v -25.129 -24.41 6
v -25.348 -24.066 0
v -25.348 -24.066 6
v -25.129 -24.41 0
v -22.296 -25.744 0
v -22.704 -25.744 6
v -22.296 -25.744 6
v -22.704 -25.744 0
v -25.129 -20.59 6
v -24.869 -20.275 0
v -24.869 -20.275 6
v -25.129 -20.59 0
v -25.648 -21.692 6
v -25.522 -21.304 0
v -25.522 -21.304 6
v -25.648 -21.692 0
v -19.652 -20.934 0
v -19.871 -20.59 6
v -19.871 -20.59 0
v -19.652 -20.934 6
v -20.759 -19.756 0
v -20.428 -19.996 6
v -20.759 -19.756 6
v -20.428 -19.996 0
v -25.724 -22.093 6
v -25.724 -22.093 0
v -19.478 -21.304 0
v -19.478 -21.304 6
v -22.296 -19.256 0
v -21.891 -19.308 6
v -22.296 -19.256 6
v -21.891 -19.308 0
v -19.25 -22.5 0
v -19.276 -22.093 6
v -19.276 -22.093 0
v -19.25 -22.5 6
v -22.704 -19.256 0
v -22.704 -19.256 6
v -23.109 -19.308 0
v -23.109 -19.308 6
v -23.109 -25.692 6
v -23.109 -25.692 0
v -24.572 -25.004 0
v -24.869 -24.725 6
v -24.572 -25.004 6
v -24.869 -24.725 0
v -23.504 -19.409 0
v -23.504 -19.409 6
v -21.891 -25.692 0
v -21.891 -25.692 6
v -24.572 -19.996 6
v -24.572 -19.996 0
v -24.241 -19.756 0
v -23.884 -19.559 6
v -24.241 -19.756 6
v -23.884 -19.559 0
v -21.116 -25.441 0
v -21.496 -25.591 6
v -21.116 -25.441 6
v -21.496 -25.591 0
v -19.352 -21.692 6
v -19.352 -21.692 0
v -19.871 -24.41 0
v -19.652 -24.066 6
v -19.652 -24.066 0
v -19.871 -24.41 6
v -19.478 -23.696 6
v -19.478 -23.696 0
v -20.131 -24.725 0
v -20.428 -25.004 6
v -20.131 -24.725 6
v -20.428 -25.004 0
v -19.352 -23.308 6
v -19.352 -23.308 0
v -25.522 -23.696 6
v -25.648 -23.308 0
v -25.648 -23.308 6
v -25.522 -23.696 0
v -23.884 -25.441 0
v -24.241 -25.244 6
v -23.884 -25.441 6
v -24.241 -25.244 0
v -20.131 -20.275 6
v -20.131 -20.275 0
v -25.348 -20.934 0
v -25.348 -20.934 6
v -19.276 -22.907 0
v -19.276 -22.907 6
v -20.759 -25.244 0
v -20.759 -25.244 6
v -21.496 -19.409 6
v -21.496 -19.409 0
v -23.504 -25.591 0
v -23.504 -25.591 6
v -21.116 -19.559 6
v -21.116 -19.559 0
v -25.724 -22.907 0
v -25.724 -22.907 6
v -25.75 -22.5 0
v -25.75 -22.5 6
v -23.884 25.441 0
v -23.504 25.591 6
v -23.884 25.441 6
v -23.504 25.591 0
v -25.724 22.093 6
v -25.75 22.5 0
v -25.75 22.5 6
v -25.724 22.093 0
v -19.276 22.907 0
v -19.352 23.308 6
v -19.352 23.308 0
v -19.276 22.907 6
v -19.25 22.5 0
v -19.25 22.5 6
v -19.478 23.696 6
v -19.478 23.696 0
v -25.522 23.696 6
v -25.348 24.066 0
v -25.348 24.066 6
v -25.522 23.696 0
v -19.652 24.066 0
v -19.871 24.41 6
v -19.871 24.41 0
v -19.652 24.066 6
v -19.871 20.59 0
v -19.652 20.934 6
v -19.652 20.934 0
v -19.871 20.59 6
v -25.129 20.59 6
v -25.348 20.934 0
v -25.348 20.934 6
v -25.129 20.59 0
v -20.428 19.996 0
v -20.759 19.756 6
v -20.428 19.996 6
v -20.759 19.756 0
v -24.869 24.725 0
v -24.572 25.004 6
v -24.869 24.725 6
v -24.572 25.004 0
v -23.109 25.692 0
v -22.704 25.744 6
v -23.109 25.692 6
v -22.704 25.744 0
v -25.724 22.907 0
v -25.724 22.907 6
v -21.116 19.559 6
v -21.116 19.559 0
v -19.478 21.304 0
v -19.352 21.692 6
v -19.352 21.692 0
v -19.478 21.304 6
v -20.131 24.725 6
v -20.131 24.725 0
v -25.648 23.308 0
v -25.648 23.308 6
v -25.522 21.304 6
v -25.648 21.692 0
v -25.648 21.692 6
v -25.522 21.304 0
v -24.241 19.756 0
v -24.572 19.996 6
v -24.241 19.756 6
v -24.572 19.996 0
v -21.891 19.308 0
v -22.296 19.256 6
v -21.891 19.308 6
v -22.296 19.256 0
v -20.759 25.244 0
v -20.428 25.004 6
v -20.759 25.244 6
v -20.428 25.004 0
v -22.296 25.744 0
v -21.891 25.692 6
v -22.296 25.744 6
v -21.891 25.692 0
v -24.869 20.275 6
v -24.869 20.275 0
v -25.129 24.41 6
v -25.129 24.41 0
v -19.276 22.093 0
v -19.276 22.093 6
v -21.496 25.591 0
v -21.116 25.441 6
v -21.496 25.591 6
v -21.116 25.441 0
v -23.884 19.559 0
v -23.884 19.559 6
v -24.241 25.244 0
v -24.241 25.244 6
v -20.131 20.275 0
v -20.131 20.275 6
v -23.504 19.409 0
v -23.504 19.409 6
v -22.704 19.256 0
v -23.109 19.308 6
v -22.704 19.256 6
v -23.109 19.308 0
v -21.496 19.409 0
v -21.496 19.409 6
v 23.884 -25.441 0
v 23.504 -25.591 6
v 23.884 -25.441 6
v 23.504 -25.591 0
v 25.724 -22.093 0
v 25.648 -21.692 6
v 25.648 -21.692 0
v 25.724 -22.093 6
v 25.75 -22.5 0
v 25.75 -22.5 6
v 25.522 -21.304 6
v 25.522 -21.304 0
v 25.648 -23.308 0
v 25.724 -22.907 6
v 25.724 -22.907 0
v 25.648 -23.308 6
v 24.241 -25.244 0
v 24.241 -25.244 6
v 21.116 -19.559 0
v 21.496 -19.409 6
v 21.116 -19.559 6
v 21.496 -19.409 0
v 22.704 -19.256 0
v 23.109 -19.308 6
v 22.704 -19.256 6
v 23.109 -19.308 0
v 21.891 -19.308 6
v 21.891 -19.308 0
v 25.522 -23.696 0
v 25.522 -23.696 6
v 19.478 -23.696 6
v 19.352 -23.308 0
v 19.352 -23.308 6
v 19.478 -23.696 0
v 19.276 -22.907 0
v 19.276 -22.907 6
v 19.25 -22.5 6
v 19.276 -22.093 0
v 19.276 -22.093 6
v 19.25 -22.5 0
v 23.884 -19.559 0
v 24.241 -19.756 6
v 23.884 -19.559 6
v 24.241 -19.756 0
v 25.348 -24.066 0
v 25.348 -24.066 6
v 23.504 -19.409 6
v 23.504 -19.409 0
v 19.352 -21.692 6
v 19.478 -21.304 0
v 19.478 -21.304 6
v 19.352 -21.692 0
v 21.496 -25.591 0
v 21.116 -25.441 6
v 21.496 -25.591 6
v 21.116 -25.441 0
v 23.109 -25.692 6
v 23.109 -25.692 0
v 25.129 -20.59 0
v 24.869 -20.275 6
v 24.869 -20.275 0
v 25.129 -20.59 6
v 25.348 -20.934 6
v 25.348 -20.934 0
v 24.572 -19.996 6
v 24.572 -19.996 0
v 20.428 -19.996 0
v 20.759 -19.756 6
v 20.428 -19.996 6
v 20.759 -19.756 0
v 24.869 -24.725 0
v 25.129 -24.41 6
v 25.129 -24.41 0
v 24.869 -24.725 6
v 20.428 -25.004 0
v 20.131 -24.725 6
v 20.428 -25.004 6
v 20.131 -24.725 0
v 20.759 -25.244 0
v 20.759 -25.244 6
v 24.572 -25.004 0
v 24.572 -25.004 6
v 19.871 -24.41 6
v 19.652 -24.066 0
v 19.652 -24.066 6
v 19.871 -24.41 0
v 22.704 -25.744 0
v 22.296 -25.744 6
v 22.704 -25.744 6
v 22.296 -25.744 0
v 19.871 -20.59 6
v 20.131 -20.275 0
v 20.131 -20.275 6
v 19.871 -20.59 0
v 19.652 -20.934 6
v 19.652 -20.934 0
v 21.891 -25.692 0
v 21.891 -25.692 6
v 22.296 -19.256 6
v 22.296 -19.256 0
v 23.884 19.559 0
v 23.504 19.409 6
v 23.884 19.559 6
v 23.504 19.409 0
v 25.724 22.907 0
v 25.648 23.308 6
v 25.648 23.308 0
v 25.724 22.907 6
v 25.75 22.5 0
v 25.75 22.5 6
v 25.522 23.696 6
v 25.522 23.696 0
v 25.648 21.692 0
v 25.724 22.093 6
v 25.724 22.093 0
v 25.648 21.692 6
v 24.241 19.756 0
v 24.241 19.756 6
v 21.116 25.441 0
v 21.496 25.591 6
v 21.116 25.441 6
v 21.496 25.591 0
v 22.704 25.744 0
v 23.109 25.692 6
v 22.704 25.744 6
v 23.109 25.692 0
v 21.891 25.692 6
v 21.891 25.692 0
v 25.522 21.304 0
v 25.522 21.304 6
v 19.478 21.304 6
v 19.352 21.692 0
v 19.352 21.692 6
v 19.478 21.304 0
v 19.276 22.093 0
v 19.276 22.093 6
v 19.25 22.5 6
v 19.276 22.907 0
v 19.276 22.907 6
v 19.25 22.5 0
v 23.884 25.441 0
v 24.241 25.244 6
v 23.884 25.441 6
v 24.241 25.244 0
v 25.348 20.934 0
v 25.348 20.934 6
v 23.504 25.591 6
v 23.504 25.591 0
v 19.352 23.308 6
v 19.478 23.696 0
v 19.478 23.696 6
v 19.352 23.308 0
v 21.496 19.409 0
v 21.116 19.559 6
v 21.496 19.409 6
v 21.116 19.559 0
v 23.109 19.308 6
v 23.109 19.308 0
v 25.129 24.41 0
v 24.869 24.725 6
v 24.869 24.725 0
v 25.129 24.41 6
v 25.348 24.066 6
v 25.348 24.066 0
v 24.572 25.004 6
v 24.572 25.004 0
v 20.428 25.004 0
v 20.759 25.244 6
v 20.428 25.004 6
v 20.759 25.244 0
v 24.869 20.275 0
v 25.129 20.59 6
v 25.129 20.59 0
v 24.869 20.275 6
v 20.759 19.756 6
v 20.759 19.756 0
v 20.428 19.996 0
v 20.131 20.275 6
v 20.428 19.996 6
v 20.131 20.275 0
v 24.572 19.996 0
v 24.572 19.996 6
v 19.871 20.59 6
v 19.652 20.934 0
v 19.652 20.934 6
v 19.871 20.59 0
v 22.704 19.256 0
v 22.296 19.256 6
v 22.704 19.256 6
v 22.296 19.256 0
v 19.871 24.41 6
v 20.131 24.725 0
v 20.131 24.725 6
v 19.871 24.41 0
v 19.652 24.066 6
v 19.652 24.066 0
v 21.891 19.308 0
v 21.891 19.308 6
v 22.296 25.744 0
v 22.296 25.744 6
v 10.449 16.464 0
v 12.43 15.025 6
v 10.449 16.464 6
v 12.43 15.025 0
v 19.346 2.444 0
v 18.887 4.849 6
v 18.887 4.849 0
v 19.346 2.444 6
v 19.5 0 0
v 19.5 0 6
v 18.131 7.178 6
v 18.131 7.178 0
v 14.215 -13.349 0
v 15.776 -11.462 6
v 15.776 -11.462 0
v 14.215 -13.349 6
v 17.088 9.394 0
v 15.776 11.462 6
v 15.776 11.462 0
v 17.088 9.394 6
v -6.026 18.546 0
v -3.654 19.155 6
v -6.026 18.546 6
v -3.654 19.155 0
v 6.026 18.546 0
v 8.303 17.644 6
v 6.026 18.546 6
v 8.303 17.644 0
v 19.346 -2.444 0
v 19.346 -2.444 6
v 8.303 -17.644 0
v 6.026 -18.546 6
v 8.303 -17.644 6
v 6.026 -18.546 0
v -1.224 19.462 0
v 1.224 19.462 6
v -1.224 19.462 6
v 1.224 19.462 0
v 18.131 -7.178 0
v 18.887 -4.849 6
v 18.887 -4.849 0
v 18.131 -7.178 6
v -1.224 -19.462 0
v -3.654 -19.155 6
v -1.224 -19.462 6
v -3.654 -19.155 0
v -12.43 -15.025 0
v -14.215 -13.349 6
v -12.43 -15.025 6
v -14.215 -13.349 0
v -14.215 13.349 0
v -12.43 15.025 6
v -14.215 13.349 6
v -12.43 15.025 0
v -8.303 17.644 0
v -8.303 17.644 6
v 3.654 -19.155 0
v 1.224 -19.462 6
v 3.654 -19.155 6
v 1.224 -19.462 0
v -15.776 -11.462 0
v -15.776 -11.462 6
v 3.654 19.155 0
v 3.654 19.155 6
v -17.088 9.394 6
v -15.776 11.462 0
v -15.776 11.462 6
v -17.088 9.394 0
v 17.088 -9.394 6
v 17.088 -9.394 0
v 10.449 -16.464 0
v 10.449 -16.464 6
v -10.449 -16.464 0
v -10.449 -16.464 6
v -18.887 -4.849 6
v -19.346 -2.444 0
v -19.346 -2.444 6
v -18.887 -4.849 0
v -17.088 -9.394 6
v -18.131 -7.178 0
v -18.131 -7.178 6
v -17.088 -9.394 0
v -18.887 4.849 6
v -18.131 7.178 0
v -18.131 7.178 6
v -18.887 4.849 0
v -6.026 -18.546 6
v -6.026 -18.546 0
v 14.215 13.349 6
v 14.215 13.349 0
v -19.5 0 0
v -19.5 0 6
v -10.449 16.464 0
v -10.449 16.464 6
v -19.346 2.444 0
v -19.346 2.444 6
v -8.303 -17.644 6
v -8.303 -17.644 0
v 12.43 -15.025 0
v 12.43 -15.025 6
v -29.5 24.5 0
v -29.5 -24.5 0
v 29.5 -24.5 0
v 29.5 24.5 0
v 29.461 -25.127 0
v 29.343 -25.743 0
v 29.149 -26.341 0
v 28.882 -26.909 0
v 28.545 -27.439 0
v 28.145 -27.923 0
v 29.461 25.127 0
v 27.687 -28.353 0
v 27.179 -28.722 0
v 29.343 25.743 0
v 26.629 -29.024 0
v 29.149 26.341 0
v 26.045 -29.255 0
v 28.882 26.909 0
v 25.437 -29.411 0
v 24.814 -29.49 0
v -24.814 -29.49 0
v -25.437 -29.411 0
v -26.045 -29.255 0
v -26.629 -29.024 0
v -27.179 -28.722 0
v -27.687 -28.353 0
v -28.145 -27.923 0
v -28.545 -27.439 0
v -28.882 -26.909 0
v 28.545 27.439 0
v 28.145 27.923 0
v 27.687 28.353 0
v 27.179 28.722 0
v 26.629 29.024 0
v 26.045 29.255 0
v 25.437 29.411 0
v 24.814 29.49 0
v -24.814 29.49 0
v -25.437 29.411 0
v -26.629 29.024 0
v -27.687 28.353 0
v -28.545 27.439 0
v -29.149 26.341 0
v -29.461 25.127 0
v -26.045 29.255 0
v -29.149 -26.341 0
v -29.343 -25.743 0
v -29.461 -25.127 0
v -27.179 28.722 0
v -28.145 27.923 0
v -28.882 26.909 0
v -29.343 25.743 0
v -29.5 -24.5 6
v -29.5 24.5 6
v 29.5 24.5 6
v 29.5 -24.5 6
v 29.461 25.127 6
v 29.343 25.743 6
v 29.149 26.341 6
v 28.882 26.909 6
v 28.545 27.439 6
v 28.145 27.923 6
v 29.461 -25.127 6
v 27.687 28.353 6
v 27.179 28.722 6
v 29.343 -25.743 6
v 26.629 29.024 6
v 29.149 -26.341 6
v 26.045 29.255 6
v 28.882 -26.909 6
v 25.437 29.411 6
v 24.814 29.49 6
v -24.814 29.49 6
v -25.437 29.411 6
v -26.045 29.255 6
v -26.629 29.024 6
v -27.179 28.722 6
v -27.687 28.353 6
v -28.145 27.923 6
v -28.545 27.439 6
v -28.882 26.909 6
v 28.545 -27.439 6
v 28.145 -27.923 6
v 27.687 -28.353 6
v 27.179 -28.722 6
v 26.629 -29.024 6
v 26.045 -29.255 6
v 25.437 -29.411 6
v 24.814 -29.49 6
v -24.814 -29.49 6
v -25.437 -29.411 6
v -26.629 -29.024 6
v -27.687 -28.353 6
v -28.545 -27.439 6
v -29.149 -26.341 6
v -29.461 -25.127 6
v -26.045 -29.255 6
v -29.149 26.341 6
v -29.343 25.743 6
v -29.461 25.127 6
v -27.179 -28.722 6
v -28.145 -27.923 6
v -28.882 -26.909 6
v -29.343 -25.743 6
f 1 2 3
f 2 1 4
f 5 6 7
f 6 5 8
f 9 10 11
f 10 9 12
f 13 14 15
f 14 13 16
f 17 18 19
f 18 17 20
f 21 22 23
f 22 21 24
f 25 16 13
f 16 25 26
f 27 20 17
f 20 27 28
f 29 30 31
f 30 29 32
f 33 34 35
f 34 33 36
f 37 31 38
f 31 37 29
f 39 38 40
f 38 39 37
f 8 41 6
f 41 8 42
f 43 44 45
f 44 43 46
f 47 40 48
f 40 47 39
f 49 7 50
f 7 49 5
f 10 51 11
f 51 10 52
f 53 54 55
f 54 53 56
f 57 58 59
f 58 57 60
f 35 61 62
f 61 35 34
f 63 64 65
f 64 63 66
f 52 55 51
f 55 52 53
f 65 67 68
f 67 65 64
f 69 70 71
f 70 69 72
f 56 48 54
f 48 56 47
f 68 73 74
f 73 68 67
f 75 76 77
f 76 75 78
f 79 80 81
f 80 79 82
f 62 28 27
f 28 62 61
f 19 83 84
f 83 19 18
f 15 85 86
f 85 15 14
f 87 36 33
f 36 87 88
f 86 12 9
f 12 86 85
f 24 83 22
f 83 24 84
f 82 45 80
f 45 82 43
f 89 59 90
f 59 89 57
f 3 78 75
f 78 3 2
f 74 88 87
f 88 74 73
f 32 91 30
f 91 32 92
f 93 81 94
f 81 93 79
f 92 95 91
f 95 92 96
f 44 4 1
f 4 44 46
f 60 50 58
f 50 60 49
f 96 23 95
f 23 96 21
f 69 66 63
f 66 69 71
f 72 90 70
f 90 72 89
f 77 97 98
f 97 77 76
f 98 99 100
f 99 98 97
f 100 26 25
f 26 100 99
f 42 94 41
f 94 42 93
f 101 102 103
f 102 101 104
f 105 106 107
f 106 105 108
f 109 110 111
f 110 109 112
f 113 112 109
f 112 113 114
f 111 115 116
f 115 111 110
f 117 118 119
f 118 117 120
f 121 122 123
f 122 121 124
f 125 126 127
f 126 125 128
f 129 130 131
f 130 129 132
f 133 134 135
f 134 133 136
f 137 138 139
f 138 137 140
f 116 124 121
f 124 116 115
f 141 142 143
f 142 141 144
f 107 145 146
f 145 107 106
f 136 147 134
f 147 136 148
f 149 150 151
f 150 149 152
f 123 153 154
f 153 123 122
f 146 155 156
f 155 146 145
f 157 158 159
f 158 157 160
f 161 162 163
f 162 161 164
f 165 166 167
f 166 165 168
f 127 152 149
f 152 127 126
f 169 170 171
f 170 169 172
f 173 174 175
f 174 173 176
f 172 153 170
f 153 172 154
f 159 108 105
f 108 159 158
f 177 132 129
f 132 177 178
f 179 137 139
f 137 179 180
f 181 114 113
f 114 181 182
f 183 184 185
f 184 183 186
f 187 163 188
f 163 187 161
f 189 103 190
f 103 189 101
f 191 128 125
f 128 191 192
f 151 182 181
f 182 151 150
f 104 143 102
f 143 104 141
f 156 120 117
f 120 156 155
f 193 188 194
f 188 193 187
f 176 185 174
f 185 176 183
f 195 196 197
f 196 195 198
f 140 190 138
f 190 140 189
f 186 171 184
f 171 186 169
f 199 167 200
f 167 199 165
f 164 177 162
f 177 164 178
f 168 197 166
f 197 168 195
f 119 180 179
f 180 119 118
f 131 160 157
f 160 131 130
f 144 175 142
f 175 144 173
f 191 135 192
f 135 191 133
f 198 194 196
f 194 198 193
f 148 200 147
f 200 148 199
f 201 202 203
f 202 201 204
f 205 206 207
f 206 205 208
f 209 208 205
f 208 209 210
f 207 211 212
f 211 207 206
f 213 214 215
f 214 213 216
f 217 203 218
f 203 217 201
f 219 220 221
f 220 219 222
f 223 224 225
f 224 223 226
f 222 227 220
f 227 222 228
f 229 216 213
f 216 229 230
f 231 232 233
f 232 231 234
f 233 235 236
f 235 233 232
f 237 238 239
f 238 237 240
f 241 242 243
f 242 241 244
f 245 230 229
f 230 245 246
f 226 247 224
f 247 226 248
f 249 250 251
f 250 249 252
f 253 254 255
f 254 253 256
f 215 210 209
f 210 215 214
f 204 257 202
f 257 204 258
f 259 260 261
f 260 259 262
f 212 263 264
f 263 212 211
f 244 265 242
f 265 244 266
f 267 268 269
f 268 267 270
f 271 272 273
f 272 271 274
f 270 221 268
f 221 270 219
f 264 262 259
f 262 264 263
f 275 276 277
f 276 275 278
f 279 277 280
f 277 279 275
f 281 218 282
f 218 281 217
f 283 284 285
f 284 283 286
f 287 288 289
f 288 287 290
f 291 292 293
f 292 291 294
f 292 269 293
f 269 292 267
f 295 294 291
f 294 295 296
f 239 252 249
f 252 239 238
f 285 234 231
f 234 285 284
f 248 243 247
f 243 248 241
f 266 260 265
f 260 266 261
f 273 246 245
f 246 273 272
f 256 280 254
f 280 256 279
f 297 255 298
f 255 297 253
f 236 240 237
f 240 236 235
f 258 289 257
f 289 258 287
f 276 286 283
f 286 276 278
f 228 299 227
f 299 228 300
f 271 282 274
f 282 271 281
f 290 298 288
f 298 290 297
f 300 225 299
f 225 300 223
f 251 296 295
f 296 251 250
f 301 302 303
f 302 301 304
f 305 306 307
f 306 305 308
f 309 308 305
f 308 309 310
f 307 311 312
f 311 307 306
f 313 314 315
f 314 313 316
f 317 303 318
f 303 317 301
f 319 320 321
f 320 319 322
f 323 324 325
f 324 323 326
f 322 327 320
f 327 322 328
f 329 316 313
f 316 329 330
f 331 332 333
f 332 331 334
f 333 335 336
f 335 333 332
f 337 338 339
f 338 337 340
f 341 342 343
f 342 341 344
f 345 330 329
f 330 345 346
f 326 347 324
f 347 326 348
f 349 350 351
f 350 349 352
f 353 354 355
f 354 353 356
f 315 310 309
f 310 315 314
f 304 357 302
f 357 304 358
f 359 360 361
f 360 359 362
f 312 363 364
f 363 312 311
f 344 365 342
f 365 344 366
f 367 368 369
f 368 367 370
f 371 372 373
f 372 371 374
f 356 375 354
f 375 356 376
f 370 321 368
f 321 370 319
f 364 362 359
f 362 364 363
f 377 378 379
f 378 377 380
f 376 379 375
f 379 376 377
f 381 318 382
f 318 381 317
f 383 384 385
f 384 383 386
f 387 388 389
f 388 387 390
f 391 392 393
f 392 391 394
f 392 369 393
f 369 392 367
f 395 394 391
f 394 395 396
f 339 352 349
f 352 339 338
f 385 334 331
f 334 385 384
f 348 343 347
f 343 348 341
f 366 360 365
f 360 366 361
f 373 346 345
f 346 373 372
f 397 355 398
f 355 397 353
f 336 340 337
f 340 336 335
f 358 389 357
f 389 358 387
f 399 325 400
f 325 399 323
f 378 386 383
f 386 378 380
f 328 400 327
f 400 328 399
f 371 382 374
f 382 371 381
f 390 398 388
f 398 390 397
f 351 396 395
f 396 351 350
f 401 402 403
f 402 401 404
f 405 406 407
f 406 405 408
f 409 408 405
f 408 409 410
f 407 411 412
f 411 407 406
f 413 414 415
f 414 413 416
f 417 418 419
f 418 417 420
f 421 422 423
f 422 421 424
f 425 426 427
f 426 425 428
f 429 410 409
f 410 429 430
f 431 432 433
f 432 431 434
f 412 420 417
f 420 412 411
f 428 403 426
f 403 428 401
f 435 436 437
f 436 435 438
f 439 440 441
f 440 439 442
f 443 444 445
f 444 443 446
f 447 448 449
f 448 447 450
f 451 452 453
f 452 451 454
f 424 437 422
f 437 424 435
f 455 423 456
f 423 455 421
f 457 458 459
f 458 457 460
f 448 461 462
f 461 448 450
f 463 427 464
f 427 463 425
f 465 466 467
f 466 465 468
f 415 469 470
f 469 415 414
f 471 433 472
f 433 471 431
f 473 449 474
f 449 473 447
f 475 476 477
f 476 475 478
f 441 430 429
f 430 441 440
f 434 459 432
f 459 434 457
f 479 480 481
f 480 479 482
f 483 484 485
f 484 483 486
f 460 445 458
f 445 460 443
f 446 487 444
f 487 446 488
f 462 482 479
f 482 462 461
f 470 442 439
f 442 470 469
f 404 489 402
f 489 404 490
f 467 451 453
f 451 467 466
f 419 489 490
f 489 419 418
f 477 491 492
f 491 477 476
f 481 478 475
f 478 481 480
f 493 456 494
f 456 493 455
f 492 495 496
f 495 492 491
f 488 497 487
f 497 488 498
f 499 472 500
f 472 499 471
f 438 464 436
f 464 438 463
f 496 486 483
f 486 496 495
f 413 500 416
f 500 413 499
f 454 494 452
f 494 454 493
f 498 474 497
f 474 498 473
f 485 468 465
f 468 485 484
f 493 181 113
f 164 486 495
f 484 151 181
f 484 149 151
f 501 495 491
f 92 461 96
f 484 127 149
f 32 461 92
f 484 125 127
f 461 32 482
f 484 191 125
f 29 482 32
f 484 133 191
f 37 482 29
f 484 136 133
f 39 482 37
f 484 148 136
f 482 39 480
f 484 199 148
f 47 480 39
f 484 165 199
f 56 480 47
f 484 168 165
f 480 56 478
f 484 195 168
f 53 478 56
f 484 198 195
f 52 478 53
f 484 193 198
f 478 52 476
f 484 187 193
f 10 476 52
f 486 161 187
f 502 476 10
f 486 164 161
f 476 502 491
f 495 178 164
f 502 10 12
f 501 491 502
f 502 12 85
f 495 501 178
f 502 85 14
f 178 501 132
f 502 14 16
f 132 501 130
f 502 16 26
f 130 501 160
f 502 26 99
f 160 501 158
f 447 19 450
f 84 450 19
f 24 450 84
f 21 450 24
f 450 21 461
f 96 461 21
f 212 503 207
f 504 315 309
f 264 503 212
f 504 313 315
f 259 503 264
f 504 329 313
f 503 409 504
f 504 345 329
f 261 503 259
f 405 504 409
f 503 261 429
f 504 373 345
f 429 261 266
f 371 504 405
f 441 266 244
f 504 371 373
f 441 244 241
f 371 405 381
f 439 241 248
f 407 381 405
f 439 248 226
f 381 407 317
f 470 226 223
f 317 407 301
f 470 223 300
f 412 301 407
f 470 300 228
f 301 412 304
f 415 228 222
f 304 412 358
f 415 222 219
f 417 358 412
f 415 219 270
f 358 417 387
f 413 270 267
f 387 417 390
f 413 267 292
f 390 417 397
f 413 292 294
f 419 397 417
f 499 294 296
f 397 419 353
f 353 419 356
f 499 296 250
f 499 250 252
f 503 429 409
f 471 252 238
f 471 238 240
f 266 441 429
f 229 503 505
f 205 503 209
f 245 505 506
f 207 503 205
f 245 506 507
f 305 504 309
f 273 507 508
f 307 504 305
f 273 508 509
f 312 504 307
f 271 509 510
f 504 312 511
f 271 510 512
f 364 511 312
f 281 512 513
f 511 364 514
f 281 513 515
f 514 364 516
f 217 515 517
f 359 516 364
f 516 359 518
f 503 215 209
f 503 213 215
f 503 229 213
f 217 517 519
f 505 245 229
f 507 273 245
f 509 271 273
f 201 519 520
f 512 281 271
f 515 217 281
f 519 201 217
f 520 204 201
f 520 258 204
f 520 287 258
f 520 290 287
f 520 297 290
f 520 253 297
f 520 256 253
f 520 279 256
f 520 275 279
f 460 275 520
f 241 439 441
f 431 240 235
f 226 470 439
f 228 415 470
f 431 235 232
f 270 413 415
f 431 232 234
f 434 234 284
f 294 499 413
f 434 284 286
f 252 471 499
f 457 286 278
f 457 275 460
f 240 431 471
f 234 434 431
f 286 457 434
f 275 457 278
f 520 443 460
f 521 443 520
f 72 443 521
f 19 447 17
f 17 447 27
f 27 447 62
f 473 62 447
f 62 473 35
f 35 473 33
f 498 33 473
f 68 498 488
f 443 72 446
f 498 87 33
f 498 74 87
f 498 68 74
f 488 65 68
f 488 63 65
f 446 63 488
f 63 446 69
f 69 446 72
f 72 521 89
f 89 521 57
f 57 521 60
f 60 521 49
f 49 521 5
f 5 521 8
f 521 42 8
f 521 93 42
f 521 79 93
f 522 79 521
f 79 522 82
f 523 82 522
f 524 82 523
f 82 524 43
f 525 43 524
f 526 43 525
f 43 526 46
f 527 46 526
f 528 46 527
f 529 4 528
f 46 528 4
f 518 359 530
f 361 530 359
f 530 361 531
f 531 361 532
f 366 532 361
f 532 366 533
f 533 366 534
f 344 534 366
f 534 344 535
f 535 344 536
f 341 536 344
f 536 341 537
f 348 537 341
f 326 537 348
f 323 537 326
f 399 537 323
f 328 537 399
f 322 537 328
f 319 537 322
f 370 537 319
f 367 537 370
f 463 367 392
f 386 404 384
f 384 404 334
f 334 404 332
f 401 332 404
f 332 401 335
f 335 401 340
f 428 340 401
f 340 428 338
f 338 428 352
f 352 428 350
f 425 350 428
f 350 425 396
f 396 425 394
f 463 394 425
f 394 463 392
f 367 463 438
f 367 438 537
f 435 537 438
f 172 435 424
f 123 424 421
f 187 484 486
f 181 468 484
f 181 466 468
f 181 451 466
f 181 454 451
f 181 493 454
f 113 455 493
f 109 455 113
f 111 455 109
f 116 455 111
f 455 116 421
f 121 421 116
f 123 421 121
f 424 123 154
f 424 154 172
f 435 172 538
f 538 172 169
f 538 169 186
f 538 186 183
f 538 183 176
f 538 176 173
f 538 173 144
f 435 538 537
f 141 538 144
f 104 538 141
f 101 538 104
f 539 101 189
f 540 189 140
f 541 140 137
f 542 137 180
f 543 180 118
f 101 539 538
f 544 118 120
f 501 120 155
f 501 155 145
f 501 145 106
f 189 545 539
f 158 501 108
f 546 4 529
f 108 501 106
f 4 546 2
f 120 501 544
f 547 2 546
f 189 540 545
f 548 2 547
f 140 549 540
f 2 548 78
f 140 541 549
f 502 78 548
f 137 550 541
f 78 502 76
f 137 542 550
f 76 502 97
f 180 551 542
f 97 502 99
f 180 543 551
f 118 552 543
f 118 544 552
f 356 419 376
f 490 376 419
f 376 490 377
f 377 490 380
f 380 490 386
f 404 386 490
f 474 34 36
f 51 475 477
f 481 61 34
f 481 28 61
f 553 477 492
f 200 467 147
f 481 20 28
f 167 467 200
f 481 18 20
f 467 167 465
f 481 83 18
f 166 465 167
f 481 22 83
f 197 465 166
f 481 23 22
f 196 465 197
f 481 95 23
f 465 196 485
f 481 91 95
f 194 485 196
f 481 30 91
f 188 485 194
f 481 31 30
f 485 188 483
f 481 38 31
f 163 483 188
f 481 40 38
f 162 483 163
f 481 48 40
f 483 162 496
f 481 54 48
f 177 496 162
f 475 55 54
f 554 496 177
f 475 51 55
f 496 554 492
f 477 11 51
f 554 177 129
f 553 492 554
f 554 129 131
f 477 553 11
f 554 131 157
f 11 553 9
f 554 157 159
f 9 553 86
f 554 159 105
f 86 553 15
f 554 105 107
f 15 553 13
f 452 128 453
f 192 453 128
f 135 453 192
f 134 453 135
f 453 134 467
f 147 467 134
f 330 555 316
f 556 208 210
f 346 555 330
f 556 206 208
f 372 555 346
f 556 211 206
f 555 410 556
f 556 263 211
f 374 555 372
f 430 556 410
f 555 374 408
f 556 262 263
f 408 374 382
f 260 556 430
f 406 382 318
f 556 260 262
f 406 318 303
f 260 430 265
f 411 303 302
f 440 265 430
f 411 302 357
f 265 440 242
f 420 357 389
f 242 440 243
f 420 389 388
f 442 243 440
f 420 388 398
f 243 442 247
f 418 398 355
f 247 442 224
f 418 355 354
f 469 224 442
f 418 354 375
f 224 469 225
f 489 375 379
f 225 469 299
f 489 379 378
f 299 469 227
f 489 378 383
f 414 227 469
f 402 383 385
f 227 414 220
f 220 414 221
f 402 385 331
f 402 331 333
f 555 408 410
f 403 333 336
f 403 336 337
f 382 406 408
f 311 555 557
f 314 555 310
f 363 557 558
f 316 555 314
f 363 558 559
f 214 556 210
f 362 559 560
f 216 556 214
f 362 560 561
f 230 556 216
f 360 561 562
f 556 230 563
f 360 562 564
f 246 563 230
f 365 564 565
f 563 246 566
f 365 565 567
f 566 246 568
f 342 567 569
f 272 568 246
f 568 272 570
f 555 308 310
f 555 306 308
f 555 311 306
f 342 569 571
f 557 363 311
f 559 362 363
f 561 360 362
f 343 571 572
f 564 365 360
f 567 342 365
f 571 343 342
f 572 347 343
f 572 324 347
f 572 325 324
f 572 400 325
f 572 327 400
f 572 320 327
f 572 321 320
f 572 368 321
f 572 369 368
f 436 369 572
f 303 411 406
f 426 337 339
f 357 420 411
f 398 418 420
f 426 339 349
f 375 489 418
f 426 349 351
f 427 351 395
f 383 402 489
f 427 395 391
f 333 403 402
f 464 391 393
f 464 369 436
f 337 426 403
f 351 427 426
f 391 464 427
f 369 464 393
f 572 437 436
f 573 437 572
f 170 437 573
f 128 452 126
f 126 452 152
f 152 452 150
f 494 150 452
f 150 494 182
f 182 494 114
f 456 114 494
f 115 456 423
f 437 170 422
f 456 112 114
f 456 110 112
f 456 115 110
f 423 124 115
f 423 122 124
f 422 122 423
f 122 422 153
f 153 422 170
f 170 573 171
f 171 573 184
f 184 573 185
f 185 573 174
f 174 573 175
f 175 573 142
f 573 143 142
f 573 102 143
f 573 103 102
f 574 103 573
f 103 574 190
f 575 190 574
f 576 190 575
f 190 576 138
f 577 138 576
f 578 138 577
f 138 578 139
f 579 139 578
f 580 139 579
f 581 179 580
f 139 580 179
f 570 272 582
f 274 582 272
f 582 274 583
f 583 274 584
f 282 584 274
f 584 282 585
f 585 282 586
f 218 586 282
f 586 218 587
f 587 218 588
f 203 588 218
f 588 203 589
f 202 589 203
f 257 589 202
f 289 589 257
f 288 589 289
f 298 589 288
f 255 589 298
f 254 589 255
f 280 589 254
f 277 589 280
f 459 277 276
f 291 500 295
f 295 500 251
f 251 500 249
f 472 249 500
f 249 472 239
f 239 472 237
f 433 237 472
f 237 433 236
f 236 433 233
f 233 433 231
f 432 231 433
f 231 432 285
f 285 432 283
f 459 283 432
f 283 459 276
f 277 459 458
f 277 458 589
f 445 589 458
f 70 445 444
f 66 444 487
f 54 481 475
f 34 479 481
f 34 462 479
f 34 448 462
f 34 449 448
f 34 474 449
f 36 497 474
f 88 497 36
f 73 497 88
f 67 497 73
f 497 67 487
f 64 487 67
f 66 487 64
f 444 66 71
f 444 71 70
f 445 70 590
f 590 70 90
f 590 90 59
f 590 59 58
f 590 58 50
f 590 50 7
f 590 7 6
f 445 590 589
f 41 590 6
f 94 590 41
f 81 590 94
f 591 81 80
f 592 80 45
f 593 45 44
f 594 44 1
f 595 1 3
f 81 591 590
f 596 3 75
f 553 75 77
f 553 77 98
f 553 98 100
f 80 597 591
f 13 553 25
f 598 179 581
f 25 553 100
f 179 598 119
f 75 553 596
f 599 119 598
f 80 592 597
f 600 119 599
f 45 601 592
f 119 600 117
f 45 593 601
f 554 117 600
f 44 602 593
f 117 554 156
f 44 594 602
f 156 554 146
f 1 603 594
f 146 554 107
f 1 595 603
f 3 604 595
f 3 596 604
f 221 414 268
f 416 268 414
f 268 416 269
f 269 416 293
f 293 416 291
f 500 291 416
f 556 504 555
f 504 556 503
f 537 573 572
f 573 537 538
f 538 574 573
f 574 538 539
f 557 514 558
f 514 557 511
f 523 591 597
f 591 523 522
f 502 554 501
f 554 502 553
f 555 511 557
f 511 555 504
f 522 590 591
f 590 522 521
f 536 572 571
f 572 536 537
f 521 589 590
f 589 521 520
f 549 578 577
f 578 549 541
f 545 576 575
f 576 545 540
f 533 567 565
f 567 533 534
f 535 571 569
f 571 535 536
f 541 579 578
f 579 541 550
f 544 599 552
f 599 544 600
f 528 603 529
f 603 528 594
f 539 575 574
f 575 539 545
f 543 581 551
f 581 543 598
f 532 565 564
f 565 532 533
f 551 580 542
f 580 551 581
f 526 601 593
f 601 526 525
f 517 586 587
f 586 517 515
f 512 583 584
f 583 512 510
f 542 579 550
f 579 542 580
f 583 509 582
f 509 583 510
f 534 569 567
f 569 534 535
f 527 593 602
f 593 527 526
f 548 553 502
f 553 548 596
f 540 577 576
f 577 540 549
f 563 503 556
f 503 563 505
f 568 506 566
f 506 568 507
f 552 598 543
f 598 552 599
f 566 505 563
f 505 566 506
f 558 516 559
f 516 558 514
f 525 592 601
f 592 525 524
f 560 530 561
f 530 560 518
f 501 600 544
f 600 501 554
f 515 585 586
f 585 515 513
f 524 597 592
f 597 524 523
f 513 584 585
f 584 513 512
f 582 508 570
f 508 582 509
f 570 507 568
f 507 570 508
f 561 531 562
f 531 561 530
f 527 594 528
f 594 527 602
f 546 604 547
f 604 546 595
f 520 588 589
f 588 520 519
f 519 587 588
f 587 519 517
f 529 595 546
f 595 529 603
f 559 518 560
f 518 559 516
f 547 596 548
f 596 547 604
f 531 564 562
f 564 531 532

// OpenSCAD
$fn = 50;


difference() {
	union() {
		hull() {
			translate(v = [-24.5000000000, 24.5000000000, 0]) {
				cylinder(h = 6, r = 5);
			}
			translate(v = [24.5000000000, 24.5000000000, 0]) {
				cylinder(h = 6, r = 5);
			}
			translate(v = [-24.5000000000, -24.5000000000, 0]) {
				cylinder(h = 6, r = 5);
			}
			translate(v = [24.5000000000, -24.5000000000, 0]) {
				cylinder(h = 6, r = 5);
			}
		}
	}
	union() {
		#translate(v = [-22.5000000000, -22.5000000000, -100.0000000000]) {
			cylinder(h = 200, r = 3.2500000000);
		}
		#translate(v = [-22.5000000000, 22.5000000000, -100.0000000000]) {
			cylinder(h = 200, r = 3.2500000000);
		}
		#translate(v = [22.5000000000, -22.5000000000, -100.0000000000]) {
			cylinder(h = 200, r = 3.2500000000);
		}
		#translate(v = [22.5000000000, 22.5000000000, -100.0000000000]) {
			cylinder(h = 200, r = 3.2500000000);
		}
		#cylinder(h = 6, r = 19.5000000000);
	}
}
